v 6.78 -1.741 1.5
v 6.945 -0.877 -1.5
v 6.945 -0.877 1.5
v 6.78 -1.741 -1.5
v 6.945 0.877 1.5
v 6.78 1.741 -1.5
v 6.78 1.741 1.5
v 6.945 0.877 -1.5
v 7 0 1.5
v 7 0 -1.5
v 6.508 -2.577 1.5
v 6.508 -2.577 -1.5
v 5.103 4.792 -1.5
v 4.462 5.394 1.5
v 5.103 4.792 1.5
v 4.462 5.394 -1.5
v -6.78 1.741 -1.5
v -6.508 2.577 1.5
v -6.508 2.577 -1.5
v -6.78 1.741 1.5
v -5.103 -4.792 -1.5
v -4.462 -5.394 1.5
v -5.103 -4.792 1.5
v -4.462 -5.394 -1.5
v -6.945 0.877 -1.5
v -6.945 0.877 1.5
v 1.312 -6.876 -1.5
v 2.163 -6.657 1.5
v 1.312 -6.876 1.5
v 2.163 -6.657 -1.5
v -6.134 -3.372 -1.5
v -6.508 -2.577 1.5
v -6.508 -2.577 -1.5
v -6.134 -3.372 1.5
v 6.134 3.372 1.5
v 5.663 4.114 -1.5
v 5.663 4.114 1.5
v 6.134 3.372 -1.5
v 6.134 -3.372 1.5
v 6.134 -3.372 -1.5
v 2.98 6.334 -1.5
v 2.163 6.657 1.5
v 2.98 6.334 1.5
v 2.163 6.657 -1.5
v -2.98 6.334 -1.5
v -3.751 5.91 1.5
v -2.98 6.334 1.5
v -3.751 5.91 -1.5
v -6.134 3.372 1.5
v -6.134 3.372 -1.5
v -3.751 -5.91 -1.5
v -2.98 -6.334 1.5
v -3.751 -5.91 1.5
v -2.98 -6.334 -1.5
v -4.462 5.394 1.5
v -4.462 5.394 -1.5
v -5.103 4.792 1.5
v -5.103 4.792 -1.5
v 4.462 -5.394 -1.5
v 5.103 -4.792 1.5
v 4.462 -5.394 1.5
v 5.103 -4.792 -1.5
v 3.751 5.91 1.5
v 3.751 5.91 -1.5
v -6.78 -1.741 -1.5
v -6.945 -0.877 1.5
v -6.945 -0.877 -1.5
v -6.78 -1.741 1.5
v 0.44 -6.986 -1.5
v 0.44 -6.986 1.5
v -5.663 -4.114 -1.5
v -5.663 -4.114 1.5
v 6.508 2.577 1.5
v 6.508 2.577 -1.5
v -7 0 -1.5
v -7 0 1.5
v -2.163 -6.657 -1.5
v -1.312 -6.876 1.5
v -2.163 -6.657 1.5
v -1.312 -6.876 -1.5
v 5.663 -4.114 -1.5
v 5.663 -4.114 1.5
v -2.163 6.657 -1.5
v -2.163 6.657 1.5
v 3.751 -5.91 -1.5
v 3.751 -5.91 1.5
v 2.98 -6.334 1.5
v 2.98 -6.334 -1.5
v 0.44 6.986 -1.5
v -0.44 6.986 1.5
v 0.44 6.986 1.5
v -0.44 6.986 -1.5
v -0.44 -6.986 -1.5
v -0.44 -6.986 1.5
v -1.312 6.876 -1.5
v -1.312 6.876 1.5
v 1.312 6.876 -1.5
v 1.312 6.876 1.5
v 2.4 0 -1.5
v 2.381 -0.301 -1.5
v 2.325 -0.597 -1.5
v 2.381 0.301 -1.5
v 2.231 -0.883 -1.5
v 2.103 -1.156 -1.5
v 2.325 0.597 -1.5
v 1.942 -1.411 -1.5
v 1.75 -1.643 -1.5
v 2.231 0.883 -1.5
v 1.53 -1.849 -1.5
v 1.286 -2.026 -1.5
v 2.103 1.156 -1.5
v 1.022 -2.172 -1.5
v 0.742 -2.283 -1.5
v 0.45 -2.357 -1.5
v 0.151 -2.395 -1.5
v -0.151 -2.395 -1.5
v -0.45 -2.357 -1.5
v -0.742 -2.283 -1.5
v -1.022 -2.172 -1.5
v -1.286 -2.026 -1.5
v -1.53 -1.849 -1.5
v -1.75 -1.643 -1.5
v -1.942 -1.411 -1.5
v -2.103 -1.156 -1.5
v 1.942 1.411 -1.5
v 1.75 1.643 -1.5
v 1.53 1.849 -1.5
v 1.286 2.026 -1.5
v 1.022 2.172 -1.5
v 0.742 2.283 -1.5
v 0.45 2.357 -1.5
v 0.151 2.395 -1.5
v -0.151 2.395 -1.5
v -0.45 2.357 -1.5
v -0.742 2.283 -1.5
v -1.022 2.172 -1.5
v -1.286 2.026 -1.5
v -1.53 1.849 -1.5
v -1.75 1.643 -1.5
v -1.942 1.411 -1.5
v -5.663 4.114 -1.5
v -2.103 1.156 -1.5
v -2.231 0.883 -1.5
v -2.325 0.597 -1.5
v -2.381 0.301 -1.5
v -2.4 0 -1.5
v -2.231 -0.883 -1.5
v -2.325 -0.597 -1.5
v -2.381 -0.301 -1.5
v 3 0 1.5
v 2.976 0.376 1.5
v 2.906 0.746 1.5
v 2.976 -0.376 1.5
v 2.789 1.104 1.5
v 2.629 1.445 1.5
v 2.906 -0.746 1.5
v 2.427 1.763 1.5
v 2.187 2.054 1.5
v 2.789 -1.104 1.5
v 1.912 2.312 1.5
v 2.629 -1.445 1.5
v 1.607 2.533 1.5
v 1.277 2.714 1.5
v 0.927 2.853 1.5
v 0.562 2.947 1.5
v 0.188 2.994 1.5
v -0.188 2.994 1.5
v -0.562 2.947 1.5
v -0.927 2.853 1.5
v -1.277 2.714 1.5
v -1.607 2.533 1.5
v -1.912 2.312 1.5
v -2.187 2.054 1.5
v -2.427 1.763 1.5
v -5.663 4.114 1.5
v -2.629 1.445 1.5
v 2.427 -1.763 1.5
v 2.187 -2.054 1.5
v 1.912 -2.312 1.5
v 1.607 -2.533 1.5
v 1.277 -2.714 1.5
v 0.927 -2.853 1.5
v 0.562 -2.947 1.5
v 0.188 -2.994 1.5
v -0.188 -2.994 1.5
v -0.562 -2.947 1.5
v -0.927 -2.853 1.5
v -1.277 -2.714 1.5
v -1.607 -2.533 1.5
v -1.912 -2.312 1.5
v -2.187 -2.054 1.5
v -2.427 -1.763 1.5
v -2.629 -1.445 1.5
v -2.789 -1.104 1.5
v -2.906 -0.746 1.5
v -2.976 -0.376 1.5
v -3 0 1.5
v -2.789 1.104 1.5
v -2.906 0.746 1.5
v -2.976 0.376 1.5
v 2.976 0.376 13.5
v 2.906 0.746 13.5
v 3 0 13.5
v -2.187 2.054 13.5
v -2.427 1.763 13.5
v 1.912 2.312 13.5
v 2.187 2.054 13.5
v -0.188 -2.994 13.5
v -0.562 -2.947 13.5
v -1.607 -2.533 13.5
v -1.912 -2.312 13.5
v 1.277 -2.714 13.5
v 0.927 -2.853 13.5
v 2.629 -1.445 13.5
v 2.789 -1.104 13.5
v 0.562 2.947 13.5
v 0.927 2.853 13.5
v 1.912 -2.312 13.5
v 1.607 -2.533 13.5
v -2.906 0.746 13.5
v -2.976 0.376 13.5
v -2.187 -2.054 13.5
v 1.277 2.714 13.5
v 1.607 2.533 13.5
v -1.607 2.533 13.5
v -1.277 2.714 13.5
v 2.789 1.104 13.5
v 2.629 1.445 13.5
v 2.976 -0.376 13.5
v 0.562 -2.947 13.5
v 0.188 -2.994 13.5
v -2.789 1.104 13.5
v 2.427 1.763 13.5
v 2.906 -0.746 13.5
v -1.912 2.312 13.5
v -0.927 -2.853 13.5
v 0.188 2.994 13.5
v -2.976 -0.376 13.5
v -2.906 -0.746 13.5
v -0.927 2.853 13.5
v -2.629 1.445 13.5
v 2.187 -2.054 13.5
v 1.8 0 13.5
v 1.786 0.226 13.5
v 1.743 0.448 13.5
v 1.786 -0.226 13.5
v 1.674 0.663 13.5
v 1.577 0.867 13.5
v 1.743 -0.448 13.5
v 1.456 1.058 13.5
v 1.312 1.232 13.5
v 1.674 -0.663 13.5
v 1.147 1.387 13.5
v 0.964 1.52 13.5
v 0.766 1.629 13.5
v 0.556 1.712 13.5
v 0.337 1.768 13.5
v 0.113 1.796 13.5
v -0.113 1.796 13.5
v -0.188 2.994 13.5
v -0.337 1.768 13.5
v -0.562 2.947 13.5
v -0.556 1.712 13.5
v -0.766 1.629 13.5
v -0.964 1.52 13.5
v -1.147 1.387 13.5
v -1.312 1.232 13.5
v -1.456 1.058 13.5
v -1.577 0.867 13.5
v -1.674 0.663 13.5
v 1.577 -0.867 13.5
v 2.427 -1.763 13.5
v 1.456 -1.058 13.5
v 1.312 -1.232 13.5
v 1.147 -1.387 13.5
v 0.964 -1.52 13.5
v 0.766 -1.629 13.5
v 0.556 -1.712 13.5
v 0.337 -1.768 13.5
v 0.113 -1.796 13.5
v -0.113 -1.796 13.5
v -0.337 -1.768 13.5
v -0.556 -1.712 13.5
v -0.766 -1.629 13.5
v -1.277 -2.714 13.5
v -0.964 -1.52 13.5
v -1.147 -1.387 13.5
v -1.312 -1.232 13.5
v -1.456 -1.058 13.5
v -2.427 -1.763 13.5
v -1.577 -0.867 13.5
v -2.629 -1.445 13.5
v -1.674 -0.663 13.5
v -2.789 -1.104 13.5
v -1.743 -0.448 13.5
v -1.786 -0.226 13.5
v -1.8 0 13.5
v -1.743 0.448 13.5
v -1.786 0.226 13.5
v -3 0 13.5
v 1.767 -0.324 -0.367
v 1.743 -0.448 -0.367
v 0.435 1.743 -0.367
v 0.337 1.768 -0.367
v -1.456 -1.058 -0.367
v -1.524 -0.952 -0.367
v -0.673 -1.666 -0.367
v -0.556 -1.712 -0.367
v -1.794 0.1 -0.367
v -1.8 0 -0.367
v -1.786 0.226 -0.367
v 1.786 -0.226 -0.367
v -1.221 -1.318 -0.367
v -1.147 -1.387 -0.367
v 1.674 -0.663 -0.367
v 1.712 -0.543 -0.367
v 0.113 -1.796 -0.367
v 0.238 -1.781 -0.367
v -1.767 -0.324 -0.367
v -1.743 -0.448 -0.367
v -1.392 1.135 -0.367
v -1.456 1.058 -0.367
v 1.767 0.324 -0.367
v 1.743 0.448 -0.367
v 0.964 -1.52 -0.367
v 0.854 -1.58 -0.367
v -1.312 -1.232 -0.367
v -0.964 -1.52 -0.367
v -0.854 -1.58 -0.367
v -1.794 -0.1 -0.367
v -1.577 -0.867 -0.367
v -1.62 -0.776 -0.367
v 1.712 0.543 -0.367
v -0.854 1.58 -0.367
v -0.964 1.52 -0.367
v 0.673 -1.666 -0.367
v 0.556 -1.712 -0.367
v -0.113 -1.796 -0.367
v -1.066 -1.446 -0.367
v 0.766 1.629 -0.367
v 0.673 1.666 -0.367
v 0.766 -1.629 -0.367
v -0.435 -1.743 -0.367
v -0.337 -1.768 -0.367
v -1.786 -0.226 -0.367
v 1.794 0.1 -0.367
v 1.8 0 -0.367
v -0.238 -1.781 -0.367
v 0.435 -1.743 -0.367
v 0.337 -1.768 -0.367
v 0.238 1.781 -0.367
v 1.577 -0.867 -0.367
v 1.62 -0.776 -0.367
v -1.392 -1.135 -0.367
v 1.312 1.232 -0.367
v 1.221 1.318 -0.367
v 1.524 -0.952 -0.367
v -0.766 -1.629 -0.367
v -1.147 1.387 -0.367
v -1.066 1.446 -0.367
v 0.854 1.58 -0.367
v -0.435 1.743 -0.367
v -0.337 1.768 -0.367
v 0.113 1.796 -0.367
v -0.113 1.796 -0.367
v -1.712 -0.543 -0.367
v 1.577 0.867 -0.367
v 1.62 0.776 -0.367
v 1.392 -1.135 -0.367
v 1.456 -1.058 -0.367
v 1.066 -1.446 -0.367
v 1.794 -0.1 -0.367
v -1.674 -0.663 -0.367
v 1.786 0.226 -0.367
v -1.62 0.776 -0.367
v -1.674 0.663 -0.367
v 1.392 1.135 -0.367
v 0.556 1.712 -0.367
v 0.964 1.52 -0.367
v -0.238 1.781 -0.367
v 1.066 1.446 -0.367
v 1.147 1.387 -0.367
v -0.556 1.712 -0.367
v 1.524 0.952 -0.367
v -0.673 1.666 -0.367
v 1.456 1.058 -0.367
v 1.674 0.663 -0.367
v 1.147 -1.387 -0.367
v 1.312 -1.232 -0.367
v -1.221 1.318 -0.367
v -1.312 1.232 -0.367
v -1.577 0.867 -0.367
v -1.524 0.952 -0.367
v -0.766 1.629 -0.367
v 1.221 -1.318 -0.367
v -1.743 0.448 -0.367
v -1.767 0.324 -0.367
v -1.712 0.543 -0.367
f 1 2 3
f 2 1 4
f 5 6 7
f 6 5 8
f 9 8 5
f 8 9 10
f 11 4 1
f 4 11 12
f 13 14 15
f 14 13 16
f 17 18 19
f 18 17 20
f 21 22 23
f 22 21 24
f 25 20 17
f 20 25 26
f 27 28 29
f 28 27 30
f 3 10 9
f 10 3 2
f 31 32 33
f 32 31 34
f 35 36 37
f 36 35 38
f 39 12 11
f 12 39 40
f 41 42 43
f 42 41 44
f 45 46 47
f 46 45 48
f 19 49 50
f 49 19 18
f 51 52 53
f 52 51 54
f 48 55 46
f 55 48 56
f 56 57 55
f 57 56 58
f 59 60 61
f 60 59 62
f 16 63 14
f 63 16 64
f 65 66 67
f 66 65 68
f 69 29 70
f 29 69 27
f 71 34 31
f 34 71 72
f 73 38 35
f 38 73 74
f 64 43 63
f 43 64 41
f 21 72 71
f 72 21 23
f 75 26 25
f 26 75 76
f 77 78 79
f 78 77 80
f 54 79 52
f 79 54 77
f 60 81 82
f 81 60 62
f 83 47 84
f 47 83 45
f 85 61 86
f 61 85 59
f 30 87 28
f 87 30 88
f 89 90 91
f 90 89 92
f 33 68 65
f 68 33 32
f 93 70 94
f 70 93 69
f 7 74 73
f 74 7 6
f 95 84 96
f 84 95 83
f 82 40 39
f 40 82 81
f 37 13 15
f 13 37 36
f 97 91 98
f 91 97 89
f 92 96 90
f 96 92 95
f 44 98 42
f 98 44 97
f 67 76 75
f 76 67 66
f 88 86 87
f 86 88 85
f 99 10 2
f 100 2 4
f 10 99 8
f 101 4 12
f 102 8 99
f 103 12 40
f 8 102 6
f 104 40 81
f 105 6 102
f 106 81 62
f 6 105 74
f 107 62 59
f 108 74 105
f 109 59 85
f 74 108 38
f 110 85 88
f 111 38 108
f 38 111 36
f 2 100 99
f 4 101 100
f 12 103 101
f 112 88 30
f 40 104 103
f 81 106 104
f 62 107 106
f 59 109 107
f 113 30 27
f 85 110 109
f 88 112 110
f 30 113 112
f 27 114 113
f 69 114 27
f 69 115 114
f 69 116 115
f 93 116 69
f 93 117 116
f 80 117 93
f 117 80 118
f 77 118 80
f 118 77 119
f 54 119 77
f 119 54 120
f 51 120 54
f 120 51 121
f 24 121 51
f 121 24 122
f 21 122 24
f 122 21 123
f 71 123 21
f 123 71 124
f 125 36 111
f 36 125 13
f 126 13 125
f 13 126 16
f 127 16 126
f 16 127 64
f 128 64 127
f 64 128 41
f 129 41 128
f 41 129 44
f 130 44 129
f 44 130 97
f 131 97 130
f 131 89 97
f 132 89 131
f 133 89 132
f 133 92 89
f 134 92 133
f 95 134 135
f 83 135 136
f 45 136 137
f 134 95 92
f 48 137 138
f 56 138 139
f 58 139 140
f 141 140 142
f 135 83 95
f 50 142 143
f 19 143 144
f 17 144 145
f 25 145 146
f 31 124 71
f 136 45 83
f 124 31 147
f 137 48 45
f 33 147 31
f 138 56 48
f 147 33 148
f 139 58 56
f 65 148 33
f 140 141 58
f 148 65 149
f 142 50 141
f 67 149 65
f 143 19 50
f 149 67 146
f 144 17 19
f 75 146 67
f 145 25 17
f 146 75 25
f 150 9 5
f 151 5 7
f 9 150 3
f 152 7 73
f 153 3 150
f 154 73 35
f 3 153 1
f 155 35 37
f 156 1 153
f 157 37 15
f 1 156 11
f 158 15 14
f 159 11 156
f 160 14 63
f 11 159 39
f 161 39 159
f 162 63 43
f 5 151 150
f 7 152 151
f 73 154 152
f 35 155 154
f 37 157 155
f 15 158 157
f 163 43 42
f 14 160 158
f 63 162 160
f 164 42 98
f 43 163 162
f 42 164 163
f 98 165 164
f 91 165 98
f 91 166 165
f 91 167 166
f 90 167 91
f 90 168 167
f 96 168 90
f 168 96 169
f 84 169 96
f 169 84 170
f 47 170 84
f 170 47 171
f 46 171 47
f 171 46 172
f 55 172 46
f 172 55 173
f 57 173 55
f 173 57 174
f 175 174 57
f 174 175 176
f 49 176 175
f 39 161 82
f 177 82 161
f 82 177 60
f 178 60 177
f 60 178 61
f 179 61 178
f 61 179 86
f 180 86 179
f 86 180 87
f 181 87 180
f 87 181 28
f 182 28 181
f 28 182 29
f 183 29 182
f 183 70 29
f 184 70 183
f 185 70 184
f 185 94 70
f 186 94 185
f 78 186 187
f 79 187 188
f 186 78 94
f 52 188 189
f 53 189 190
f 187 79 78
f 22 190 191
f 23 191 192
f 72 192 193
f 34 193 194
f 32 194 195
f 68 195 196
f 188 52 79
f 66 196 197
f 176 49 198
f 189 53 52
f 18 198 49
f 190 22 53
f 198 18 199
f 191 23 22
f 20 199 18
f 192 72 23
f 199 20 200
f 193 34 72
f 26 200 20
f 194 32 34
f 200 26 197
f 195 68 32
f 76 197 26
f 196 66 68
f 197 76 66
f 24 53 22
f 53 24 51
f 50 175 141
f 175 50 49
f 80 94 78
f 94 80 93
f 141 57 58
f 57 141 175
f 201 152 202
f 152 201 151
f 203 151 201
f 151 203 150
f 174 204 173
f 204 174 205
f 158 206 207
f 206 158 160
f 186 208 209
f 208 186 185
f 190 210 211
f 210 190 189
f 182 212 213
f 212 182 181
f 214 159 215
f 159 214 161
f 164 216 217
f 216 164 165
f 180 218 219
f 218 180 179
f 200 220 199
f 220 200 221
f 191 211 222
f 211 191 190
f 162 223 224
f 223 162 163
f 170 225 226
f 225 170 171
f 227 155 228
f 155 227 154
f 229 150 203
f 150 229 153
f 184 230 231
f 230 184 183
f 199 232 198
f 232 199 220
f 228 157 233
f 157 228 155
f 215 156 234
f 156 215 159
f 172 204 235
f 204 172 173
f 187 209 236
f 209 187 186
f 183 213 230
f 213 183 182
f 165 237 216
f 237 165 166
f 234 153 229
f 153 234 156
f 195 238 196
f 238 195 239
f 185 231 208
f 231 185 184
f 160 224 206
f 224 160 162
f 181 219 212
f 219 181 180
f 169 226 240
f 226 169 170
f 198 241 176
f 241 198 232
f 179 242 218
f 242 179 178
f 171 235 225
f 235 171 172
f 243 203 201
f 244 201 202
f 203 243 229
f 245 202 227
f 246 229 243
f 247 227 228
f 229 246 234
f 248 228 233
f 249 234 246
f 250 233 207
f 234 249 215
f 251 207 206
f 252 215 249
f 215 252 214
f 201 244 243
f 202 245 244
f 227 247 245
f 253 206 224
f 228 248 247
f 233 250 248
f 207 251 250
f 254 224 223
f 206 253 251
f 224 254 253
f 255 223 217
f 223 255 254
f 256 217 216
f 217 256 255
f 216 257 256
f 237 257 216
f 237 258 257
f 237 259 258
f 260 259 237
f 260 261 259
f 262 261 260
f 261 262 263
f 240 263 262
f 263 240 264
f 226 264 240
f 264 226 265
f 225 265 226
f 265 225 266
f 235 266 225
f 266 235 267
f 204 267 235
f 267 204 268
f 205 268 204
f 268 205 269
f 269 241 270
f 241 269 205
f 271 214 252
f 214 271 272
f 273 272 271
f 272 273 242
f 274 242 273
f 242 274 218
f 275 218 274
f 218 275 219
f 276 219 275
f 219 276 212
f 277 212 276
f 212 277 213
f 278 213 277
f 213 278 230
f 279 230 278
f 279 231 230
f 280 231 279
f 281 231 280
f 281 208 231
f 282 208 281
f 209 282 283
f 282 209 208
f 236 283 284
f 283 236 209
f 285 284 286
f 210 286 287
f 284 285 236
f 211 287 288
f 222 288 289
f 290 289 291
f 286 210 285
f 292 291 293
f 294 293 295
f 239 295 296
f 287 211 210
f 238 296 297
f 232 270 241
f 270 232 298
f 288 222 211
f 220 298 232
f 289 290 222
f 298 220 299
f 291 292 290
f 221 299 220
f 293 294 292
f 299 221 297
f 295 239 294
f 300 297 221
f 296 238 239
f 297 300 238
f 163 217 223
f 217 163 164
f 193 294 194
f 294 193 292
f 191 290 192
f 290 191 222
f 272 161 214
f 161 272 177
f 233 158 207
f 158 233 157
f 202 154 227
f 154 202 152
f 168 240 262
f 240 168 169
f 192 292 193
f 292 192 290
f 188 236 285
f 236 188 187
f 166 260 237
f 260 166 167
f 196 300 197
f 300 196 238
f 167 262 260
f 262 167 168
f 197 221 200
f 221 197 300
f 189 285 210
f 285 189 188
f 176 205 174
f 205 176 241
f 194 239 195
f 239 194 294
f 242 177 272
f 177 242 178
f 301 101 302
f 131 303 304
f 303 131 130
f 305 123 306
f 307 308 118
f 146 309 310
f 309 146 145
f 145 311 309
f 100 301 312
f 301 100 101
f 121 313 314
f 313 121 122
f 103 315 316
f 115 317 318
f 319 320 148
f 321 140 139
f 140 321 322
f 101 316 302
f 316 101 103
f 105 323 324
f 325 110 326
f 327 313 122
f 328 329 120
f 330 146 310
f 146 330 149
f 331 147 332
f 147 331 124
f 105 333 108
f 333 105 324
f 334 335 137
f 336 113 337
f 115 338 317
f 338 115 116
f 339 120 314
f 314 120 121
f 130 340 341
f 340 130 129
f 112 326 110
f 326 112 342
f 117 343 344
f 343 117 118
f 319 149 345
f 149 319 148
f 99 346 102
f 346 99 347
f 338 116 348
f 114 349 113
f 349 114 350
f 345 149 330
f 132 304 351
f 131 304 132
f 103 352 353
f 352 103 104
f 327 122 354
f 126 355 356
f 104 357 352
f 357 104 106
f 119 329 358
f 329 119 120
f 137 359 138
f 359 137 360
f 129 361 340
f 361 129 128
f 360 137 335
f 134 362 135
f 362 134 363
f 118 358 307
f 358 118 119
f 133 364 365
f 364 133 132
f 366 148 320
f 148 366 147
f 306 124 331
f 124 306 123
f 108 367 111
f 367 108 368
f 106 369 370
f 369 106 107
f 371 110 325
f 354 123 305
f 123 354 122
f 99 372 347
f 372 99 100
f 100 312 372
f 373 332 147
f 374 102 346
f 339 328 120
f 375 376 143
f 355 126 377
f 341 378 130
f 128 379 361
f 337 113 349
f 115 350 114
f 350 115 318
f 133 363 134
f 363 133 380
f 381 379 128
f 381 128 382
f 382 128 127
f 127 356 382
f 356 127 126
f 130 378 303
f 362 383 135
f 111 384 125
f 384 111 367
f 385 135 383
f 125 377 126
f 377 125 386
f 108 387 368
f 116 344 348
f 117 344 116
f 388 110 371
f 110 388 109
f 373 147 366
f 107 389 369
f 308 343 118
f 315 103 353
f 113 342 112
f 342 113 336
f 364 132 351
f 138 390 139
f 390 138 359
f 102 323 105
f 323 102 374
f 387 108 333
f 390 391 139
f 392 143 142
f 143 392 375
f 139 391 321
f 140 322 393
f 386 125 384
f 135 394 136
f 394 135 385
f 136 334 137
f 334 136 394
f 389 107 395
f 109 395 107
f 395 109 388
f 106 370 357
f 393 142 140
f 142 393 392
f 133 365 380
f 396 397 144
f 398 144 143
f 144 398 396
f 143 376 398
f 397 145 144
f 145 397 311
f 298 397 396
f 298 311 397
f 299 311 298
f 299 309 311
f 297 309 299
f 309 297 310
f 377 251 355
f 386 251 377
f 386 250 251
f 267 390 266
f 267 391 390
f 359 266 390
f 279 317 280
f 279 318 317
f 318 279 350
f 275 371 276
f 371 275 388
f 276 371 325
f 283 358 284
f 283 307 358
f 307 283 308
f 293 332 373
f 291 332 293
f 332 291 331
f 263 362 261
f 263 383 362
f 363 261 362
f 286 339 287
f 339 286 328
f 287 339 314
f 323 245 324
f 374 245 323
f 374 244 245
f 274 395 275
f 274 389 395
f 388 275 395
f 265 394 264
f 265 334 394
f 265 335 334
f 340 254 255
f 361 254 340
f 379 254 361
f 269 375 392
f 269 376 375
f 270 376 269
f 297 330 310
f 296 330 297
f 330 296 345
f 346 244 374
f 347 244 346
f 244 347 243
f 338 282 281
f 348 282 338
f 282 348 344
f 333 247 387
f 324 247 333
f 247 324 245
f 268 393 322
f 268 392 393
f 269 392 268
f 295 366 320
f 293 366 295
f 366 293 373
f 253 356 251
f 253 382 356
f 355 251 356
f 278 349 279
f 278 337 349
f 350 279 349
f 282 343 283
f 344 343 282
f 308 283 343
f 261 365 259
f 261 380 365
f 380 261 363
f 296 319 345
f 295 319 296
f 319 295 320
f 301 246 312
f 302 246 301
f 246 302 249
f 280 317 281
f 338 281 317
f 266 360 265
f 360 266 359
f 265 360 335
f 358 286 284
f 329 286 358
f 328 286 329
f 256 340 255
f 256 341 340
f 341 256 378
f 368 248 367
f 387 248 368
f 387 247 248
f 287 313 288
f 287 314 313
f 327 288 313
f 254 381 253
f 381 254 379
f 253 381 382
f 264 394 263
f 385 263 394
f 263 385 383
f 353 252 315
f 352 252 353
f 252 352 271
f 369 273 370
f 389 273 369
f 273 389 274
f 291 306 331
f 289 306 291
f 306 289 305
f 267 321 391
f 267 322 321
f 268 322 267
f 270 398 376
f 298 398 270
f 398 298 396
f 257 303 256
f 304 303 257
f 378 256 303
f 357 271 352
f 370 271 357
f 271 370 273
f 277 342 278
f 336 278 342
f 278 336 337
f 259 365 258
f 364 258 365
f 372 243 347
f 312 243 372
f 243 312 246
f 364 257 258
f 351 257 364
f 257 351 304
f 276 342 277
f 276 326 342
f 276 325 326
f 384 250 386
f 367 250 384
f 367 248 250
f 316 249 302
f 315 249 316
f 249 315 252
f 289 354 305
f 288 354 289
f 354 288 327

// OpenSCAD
$fn = 50;


difference() {
	union() {
		translate(v = [0, 0, -1.5000000000]) {
			cylinder(h = 3, r = 7.0000000000);
		}
		translate(v = [0, 0, -1.5000000000]) {
			cylinder(h = 15, r = 3.0000000000);
		}
	}
	union() {
		translate(v = [0, 0, -1.5000000000]) {
			rotate(a = [0, 180, 0]) {
				difference() {
					union() {
						translate(v = [0, 0, -1.7000000000]) {
							cylinder(h = 1.7000000000, r1 = 1.5000000000, r2 = 2.4000000000);
						}
						translate(v = [0, 0, -15.0000000000]) {
							cylinder(h = 15, r = 1.5000000000);
						}
						translate(v = [0, 0, -15.0000000000]) {
							cylinder(h = 15, r = 1.8000000000);
						}
						translate(v = [0, 0, -15.0000000000]) {
							cylinder(h = 15, r = 1.5000000000);
						}
					}
					union();
				}
			}
		}
		translate(v = [0, 0, -50.0000000000]) {
			cylinder(h = 100, r = 1.5000000000);
		}
	}
}
